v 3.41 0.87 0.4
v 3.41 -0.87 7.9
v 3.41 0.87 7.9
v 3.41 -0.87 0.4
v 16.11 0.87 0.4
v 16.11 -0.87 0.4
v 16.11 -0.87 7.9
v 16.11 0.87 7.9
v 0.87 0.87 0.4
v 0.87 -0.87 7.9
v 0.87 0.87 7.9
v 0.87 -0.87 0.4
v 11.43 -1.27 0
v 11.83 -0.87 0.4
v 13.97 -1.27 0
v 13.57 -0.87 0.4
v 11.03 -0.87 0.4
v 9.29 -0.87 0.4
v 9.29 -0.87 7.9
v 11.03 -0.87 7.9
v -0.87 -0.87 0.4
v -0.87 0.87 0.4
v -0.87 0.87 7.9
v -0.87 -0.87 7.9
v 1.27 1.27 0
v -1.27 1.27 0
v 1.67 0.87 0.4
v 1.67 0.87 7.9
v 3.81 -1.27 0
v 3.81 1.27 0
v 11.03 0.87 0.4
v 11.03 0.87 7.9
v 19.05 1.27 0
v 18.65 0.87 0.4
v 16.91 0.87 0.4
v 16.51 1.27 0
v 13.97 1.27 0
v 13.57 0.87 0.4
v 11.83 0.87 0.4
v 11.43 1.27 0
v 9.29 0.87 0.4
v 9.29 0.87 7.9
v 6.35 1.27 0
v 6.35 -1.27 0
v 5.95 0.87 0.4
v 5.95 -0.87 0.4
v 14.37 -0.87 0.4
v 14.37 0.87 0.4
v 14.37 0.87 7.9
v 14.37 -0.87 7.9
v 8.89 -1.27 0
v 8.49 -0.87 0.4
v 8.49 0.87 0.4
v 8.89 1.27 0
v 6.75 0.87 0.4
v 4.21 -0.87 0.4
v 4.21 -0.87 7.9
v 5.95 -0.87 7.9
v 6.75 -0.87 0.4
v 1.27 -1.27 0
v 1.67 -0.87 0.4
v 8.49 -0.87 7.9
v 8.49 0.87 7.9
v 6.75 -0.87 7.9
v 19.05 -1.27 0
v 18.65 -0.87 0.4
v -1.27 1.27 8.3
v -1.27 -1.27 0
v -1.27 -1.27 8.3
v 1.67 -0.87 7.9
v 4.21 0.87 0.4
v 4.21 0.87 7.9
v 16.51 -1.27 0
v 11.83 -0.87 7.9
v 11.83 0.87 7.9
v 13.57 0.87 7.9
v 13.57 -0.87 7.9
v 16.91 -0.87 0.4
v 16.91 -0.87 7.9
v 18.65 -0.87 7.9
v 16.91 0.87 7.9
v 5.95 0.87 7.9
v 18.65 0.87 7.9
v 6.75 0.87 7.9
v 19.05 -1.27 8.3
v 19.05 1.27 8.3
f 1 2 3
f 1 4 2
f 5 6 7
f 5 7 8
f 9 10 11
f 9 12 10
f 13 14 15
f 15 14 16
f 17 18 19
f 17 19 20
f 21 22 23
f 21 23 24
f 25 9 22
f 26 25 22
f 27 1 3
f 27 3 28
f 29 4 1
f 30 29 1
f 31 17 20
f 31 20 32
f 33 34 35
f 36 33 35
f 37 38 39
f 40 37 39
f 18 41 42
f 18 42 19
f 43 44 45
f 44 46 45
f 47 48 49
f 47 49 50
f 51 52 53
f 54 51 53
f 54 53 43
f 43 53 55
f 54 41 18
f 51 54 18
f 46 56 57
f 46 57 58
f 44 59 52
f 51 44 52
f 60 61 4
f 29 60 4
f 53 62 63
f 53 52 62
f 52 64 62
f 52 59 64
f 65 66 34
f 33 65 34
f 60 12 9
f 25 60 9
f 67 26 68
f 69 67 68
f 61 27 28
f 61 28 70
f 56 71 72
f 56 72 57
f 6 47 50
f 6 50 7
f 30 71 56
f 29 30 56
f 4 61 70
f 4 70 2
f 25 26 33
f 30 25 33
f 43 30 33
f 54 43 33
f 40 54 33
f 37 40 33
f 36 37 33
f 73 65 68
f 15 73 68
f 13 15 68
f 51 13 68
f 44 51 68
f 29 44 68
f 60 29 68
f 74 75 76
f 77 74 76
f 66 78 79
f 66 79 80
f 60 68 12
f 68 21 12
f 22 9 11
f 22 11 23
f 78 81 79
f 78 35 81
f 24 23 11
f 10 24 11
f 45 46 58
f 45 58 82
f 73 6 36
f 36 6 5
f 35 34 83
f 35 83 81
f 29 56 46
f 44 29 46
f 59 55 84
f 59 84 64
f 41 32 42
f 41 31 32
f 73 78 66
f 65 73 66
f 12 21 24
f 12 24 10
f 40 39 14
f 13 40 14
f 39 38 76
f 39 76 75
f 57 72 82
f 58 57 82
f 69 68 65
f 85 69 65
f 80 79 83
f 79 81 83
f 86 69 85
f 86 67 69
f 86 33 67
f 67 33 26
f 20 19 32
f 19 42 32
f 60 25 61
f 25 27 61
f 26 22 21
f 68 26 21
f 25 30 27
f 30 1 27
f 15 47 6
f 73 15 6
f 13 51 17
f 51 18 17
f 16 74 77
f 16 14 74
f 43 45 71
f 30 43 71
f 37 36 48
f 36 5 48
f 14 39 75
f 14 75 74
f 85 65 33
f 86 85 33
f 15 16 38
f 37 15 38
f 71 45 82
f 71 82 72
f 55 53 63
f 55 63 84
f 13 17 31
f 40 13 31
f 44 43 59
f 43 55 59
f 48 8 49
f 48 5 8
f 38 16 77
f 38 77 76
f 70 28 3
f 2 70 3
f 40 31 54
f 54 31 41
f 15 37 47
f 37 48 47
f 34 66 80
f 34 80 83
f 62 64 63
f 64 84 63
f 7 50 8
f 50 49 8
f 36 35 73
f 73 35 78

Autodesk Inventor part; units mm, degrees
ref_plane "YZ Plane" through (0, 0, 0) normal (1, 0, 0) x (0, 1, 0)
ref_plane "XZ Plane" through (0, 0, 0) normal (0, 1, 0) x (-1, 0, 0)
ref_plane "XY Plane" through (0, 0, 0) normal (0, 0, 1) x (1, 0, 0)
sketch "Sketch1" plane through (0, 0, 0) normal (0, 0, 1) x (1, 0, 0)
  line L0 (-1.27, -1.27) -> (1.27, -1.27)
  line L1 (1.27, -1.27) -> (1.27, 1.27)
  line L2 (1.27, 1.27) -> (-1.27, 1.27)
  line L3 (-1.27, 1.27) -> (-1.27, -1.27)
  line L4 (-1.27, -1.27) -> (1.27, 1.27) construction
  line L5 (1.27, -1.27) -> (-1.27, 1.27) construction
  line L6 (-1.07, 1.07) -> (1.07, 1.07)
  line L7 (1.07, 1.07) -> (1.07, -1.07)
  line L8 (1.07, -1.07) -> (-1.07, -1.07)
  line L9 (-1.07, -1.07) -> (-1.07, 1.07)
  point P0 (0, 0)
  point P1 (0, 1.07)
  dimension "d0" = 2.54
  dimension "d1" = 2.54
  dimension "d2" = 0.2
extrude "Extrusion1" add sketch "Sketch1" along normal blind 8.3 contours L3 L2 L1 L0 | L6 L7 L8 L9
shell "Shell1" thickness 0.4 removed faces 1 at (0.4233, -0.4233, 0)
chamfer "Chamfer1" distance 0.4 angle 45 4 edges at (0, -0.87, 0) (-0.87, 0, 0) (0, 0.87, 0) (0.87, 0, 0)
pattern_linear "Rectangular Pattern1" count 8 spacing 2.54 along (1, 0, 0)
properties part number "CasePinos"
